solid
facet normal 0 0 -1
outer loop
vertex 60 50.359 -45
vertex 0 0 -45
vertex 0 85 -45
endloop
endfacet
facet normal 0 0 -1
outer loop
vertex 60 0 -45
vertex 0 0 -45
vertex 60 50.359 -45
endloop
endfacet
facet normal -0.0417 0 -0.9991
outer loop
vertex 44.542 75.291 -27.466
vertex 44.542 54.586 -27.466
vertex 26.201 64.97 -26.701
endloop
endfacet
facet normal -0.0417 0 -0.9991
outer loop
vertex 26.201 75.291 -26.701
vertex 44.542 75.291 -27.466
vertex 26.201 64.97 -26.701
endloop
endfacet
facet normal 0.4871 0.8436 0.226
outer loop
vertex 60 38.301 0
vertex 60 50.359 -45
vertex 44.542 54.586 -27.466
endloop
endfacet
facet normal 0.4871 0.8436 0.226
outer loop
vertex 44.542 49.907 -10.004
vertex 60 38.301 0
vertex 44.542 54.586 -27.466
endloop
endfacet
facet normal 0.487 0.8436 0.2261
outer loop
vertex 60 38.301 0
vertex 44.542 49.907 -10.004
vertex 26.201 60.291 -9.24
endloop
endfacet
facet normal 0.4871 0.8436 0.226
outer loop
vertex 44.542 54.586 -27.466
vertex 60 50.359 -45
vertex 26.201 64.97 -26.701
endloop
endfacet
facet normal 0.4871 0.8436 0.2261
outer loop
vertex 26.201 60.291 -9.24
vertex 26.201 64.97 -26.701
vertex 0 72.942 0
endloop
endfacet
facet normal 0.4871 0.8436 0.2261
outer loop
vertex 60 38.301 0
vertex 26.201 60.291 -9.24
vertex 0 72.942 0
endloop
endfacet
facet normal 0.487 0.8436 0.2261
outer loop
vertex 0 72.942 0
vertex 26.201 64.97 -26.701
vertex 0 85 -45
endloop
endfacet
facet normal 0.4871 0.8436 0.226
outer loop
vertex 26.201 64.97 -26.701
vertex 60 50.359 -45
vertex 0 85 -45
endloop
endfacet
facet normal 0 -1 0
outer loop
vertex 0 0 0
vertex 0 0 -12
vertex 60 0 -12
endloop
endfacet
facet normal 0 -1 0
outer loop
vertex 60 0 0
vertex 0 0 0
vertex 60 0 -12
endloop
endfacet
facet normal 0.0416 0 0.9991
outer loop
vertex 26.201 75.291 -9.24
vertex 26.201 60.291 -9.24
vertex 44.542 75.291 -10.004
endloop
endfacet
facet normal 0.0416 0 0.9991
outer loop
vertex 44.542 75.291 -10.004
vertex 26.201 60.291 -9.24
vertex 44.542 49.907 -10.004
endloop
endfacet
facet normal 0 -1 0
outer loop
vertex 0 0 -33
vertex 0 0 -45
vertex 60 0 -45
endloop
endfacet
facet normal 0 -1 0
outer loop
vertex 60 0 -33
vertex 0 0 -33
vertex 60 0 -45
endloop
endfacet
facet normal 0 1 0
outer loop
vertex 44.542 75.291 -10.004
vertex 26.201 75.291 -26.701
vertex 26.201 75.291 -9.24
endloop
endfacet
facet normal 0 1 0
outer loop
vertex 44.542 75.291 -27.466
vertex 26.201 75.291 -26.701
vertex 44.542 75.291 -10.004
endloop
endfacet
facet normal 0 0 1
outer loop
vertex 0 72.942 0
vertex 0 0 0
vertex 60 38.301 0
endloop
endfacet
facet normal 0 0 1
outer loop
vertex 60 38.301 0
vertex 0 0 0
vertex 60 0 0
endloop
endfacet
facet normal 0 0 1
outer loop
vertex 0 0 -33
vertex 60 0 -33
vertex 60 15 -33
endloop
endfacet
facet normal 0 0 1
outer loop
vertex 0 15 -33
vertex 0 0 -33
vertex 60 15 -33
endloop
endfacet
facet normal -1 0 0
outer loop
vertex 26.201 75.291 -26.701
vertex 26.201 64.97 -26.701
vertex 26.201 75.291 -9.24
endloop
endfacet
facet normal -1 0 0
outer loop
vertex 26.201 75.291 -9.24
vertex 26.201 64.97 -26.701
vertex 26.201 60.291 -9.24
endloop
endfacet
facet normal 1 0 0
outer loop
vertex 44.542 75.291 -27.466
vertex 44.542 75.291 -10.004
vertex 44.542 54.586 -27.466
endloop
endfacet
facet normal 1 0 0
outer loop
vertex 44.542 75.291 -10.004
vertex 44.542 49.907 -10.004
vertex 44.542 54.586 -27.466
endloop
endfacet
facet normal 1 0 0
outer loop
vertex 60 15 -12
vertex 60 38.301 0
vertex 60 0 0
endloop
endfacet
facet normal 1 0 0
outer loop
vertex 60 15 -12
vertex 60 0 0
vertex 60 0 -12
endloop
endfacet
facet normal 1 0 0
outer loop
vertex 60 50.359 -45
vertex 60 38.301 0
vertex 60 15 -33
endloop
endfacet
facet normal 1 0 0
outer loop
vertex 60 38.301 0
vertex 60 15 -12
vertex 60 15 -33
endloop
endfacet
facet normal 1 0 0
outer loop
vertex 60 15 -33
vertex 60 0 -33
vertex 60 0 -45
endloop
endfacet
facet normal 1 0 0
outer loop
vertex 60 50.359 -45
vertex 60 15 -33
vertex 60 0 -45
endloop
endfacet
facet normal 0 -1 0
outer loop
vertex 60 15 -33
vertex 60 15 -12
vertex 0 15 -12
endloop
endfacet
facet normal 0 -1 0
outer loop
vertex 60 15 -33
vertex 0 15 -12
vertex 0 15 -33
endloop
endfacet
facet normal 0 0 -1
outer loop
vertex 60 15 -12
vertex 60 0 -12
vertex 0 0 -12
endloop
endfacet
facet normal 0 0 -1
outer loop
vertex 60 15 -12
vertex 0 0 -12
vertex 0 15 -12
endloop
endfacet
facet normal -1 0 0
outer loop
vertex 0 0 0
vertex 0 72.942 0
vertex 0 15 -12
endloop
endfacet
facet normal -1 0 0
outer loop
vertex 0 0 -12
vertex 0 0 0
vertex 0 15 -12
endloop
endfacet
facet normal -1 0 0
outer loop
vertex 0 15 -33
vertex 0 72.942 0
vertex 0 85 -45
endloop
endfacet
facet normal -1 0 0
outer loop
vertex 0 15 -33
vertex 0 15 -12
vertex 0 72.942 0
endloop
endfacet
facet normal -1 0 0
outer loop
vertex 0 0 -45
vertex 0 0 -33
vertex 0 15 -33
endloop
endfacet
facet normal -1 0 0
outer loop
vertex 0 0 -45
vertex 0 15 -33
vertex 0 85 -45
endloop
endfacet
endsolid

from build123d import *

# Parameters (mm, degrees)
SKETCH1_W                = 60
SKETCH1_H                = 45
BOSS_EXTRUDE1_DEPTH      = 85
SKETCH2_W                = 21
SKETCH2_H                = 15
CUT_EXTRUDE1_DEPTH       = 85
CUT_EXTRUDE7_DEPTH       = 53
CUT_EXTRUDE9_DEPTH       = 42
CUT_EXTRUDE10_DEPTH      = 42
BOSS_EXTRUDE6_DEPTH      = 15
BOSS_EXTRUDE6_DEPTH_BACK = 15


with BuildPart() as part:
    # Sketch1 → Boss-Extrude1 (new body)
    with BuildSketch(Plane(origin=(0, 0, 0), x_dir=(1, 0, 0), z_dir=(0, 1, 0))):
        with Locations((30, 22.5)):
            Rectangle(SKETCH1_W, SKETCH1_H)
    extrude(amount=BOSS_EXTRUDE1_DEPTH)

    # Sketch2 → Cut-Extrude1 (cut)
    with BuildSketch(Plane(origin=(60, 0, 0), x_dir=(0, 0, -1), z_dir=(1, 0, 0))):
        with Locations((22.5, 7.5)):
            Rectangle(SKETCH2_W, SKETCH2_H)
    extrude(amount=-CUT_EXTRUDE1_DEPTH, mode=Mode.SUBTRACT)

    # Sketch10 → Cut-Extrude7 (cut)
    with BuildSketch(Plane.XY):
        Polygon((0, 85), (60, 50.358983849), (60, 85), align=None)
    extrude(amount=-CUT_EXTRUDE7_DEPTH, mode=Mode.SUBTRACT)

    # Sketch16 → Cut-Extrude9 (cut)
    with BuildSketch(Plane.ZY):
        Polygon((-45, 85), (0, 72.942286341), (0, 85), align=None)
    extrude(amount=-CUT_EXTRUDE9_DEPTH, mode=Mode.SUBTRACT)

    # Sketch17 → Cut-Extrude10 (cut)
    with BuildSketch(Plane(origin=(29.971067136, 51.911411037, 13.909620665), x_dir=(0.8733693623277136, -0.47046235880286186, -0.12606000911046442), z_dir=(0.48705847384814394, 0.843610022961955, 0.22604462437945042))):
        Polygon((34.382855821, 56.500526295), (34.382855821, 9.913098177), (-34.316600088, 18.878852898), (-34.316600088, 65.466281017), align=None)
    extrude(amount=CUT_EXTRUDE10_DEPTH, mode=Mode.SUBTRACT)

    # Sketch38 → Boss-Extrude6 (add, two sides: drawn at the far end of the back side and taken through both)
    with BuildSketch(Plane(origin=(0, 60.290929389, 0), x_dir=(-1, 0, 0), z_dir=(0, -1, 0)).offset(-BOSS_EXTRUDE6_DEPTH_BACK)):
        Polygon((-26.20108087, 9.239976128), (-44.541837479, 10.004497867), (-44.541837479, 27.465894941), (-26.20108087, 26.701373203), align=None)
    extrude(amount=BOSS_EXTRUDE6_DEPTH + BOSS_EXTRUDE6_DEPTH_BACK)


solid = part.part
